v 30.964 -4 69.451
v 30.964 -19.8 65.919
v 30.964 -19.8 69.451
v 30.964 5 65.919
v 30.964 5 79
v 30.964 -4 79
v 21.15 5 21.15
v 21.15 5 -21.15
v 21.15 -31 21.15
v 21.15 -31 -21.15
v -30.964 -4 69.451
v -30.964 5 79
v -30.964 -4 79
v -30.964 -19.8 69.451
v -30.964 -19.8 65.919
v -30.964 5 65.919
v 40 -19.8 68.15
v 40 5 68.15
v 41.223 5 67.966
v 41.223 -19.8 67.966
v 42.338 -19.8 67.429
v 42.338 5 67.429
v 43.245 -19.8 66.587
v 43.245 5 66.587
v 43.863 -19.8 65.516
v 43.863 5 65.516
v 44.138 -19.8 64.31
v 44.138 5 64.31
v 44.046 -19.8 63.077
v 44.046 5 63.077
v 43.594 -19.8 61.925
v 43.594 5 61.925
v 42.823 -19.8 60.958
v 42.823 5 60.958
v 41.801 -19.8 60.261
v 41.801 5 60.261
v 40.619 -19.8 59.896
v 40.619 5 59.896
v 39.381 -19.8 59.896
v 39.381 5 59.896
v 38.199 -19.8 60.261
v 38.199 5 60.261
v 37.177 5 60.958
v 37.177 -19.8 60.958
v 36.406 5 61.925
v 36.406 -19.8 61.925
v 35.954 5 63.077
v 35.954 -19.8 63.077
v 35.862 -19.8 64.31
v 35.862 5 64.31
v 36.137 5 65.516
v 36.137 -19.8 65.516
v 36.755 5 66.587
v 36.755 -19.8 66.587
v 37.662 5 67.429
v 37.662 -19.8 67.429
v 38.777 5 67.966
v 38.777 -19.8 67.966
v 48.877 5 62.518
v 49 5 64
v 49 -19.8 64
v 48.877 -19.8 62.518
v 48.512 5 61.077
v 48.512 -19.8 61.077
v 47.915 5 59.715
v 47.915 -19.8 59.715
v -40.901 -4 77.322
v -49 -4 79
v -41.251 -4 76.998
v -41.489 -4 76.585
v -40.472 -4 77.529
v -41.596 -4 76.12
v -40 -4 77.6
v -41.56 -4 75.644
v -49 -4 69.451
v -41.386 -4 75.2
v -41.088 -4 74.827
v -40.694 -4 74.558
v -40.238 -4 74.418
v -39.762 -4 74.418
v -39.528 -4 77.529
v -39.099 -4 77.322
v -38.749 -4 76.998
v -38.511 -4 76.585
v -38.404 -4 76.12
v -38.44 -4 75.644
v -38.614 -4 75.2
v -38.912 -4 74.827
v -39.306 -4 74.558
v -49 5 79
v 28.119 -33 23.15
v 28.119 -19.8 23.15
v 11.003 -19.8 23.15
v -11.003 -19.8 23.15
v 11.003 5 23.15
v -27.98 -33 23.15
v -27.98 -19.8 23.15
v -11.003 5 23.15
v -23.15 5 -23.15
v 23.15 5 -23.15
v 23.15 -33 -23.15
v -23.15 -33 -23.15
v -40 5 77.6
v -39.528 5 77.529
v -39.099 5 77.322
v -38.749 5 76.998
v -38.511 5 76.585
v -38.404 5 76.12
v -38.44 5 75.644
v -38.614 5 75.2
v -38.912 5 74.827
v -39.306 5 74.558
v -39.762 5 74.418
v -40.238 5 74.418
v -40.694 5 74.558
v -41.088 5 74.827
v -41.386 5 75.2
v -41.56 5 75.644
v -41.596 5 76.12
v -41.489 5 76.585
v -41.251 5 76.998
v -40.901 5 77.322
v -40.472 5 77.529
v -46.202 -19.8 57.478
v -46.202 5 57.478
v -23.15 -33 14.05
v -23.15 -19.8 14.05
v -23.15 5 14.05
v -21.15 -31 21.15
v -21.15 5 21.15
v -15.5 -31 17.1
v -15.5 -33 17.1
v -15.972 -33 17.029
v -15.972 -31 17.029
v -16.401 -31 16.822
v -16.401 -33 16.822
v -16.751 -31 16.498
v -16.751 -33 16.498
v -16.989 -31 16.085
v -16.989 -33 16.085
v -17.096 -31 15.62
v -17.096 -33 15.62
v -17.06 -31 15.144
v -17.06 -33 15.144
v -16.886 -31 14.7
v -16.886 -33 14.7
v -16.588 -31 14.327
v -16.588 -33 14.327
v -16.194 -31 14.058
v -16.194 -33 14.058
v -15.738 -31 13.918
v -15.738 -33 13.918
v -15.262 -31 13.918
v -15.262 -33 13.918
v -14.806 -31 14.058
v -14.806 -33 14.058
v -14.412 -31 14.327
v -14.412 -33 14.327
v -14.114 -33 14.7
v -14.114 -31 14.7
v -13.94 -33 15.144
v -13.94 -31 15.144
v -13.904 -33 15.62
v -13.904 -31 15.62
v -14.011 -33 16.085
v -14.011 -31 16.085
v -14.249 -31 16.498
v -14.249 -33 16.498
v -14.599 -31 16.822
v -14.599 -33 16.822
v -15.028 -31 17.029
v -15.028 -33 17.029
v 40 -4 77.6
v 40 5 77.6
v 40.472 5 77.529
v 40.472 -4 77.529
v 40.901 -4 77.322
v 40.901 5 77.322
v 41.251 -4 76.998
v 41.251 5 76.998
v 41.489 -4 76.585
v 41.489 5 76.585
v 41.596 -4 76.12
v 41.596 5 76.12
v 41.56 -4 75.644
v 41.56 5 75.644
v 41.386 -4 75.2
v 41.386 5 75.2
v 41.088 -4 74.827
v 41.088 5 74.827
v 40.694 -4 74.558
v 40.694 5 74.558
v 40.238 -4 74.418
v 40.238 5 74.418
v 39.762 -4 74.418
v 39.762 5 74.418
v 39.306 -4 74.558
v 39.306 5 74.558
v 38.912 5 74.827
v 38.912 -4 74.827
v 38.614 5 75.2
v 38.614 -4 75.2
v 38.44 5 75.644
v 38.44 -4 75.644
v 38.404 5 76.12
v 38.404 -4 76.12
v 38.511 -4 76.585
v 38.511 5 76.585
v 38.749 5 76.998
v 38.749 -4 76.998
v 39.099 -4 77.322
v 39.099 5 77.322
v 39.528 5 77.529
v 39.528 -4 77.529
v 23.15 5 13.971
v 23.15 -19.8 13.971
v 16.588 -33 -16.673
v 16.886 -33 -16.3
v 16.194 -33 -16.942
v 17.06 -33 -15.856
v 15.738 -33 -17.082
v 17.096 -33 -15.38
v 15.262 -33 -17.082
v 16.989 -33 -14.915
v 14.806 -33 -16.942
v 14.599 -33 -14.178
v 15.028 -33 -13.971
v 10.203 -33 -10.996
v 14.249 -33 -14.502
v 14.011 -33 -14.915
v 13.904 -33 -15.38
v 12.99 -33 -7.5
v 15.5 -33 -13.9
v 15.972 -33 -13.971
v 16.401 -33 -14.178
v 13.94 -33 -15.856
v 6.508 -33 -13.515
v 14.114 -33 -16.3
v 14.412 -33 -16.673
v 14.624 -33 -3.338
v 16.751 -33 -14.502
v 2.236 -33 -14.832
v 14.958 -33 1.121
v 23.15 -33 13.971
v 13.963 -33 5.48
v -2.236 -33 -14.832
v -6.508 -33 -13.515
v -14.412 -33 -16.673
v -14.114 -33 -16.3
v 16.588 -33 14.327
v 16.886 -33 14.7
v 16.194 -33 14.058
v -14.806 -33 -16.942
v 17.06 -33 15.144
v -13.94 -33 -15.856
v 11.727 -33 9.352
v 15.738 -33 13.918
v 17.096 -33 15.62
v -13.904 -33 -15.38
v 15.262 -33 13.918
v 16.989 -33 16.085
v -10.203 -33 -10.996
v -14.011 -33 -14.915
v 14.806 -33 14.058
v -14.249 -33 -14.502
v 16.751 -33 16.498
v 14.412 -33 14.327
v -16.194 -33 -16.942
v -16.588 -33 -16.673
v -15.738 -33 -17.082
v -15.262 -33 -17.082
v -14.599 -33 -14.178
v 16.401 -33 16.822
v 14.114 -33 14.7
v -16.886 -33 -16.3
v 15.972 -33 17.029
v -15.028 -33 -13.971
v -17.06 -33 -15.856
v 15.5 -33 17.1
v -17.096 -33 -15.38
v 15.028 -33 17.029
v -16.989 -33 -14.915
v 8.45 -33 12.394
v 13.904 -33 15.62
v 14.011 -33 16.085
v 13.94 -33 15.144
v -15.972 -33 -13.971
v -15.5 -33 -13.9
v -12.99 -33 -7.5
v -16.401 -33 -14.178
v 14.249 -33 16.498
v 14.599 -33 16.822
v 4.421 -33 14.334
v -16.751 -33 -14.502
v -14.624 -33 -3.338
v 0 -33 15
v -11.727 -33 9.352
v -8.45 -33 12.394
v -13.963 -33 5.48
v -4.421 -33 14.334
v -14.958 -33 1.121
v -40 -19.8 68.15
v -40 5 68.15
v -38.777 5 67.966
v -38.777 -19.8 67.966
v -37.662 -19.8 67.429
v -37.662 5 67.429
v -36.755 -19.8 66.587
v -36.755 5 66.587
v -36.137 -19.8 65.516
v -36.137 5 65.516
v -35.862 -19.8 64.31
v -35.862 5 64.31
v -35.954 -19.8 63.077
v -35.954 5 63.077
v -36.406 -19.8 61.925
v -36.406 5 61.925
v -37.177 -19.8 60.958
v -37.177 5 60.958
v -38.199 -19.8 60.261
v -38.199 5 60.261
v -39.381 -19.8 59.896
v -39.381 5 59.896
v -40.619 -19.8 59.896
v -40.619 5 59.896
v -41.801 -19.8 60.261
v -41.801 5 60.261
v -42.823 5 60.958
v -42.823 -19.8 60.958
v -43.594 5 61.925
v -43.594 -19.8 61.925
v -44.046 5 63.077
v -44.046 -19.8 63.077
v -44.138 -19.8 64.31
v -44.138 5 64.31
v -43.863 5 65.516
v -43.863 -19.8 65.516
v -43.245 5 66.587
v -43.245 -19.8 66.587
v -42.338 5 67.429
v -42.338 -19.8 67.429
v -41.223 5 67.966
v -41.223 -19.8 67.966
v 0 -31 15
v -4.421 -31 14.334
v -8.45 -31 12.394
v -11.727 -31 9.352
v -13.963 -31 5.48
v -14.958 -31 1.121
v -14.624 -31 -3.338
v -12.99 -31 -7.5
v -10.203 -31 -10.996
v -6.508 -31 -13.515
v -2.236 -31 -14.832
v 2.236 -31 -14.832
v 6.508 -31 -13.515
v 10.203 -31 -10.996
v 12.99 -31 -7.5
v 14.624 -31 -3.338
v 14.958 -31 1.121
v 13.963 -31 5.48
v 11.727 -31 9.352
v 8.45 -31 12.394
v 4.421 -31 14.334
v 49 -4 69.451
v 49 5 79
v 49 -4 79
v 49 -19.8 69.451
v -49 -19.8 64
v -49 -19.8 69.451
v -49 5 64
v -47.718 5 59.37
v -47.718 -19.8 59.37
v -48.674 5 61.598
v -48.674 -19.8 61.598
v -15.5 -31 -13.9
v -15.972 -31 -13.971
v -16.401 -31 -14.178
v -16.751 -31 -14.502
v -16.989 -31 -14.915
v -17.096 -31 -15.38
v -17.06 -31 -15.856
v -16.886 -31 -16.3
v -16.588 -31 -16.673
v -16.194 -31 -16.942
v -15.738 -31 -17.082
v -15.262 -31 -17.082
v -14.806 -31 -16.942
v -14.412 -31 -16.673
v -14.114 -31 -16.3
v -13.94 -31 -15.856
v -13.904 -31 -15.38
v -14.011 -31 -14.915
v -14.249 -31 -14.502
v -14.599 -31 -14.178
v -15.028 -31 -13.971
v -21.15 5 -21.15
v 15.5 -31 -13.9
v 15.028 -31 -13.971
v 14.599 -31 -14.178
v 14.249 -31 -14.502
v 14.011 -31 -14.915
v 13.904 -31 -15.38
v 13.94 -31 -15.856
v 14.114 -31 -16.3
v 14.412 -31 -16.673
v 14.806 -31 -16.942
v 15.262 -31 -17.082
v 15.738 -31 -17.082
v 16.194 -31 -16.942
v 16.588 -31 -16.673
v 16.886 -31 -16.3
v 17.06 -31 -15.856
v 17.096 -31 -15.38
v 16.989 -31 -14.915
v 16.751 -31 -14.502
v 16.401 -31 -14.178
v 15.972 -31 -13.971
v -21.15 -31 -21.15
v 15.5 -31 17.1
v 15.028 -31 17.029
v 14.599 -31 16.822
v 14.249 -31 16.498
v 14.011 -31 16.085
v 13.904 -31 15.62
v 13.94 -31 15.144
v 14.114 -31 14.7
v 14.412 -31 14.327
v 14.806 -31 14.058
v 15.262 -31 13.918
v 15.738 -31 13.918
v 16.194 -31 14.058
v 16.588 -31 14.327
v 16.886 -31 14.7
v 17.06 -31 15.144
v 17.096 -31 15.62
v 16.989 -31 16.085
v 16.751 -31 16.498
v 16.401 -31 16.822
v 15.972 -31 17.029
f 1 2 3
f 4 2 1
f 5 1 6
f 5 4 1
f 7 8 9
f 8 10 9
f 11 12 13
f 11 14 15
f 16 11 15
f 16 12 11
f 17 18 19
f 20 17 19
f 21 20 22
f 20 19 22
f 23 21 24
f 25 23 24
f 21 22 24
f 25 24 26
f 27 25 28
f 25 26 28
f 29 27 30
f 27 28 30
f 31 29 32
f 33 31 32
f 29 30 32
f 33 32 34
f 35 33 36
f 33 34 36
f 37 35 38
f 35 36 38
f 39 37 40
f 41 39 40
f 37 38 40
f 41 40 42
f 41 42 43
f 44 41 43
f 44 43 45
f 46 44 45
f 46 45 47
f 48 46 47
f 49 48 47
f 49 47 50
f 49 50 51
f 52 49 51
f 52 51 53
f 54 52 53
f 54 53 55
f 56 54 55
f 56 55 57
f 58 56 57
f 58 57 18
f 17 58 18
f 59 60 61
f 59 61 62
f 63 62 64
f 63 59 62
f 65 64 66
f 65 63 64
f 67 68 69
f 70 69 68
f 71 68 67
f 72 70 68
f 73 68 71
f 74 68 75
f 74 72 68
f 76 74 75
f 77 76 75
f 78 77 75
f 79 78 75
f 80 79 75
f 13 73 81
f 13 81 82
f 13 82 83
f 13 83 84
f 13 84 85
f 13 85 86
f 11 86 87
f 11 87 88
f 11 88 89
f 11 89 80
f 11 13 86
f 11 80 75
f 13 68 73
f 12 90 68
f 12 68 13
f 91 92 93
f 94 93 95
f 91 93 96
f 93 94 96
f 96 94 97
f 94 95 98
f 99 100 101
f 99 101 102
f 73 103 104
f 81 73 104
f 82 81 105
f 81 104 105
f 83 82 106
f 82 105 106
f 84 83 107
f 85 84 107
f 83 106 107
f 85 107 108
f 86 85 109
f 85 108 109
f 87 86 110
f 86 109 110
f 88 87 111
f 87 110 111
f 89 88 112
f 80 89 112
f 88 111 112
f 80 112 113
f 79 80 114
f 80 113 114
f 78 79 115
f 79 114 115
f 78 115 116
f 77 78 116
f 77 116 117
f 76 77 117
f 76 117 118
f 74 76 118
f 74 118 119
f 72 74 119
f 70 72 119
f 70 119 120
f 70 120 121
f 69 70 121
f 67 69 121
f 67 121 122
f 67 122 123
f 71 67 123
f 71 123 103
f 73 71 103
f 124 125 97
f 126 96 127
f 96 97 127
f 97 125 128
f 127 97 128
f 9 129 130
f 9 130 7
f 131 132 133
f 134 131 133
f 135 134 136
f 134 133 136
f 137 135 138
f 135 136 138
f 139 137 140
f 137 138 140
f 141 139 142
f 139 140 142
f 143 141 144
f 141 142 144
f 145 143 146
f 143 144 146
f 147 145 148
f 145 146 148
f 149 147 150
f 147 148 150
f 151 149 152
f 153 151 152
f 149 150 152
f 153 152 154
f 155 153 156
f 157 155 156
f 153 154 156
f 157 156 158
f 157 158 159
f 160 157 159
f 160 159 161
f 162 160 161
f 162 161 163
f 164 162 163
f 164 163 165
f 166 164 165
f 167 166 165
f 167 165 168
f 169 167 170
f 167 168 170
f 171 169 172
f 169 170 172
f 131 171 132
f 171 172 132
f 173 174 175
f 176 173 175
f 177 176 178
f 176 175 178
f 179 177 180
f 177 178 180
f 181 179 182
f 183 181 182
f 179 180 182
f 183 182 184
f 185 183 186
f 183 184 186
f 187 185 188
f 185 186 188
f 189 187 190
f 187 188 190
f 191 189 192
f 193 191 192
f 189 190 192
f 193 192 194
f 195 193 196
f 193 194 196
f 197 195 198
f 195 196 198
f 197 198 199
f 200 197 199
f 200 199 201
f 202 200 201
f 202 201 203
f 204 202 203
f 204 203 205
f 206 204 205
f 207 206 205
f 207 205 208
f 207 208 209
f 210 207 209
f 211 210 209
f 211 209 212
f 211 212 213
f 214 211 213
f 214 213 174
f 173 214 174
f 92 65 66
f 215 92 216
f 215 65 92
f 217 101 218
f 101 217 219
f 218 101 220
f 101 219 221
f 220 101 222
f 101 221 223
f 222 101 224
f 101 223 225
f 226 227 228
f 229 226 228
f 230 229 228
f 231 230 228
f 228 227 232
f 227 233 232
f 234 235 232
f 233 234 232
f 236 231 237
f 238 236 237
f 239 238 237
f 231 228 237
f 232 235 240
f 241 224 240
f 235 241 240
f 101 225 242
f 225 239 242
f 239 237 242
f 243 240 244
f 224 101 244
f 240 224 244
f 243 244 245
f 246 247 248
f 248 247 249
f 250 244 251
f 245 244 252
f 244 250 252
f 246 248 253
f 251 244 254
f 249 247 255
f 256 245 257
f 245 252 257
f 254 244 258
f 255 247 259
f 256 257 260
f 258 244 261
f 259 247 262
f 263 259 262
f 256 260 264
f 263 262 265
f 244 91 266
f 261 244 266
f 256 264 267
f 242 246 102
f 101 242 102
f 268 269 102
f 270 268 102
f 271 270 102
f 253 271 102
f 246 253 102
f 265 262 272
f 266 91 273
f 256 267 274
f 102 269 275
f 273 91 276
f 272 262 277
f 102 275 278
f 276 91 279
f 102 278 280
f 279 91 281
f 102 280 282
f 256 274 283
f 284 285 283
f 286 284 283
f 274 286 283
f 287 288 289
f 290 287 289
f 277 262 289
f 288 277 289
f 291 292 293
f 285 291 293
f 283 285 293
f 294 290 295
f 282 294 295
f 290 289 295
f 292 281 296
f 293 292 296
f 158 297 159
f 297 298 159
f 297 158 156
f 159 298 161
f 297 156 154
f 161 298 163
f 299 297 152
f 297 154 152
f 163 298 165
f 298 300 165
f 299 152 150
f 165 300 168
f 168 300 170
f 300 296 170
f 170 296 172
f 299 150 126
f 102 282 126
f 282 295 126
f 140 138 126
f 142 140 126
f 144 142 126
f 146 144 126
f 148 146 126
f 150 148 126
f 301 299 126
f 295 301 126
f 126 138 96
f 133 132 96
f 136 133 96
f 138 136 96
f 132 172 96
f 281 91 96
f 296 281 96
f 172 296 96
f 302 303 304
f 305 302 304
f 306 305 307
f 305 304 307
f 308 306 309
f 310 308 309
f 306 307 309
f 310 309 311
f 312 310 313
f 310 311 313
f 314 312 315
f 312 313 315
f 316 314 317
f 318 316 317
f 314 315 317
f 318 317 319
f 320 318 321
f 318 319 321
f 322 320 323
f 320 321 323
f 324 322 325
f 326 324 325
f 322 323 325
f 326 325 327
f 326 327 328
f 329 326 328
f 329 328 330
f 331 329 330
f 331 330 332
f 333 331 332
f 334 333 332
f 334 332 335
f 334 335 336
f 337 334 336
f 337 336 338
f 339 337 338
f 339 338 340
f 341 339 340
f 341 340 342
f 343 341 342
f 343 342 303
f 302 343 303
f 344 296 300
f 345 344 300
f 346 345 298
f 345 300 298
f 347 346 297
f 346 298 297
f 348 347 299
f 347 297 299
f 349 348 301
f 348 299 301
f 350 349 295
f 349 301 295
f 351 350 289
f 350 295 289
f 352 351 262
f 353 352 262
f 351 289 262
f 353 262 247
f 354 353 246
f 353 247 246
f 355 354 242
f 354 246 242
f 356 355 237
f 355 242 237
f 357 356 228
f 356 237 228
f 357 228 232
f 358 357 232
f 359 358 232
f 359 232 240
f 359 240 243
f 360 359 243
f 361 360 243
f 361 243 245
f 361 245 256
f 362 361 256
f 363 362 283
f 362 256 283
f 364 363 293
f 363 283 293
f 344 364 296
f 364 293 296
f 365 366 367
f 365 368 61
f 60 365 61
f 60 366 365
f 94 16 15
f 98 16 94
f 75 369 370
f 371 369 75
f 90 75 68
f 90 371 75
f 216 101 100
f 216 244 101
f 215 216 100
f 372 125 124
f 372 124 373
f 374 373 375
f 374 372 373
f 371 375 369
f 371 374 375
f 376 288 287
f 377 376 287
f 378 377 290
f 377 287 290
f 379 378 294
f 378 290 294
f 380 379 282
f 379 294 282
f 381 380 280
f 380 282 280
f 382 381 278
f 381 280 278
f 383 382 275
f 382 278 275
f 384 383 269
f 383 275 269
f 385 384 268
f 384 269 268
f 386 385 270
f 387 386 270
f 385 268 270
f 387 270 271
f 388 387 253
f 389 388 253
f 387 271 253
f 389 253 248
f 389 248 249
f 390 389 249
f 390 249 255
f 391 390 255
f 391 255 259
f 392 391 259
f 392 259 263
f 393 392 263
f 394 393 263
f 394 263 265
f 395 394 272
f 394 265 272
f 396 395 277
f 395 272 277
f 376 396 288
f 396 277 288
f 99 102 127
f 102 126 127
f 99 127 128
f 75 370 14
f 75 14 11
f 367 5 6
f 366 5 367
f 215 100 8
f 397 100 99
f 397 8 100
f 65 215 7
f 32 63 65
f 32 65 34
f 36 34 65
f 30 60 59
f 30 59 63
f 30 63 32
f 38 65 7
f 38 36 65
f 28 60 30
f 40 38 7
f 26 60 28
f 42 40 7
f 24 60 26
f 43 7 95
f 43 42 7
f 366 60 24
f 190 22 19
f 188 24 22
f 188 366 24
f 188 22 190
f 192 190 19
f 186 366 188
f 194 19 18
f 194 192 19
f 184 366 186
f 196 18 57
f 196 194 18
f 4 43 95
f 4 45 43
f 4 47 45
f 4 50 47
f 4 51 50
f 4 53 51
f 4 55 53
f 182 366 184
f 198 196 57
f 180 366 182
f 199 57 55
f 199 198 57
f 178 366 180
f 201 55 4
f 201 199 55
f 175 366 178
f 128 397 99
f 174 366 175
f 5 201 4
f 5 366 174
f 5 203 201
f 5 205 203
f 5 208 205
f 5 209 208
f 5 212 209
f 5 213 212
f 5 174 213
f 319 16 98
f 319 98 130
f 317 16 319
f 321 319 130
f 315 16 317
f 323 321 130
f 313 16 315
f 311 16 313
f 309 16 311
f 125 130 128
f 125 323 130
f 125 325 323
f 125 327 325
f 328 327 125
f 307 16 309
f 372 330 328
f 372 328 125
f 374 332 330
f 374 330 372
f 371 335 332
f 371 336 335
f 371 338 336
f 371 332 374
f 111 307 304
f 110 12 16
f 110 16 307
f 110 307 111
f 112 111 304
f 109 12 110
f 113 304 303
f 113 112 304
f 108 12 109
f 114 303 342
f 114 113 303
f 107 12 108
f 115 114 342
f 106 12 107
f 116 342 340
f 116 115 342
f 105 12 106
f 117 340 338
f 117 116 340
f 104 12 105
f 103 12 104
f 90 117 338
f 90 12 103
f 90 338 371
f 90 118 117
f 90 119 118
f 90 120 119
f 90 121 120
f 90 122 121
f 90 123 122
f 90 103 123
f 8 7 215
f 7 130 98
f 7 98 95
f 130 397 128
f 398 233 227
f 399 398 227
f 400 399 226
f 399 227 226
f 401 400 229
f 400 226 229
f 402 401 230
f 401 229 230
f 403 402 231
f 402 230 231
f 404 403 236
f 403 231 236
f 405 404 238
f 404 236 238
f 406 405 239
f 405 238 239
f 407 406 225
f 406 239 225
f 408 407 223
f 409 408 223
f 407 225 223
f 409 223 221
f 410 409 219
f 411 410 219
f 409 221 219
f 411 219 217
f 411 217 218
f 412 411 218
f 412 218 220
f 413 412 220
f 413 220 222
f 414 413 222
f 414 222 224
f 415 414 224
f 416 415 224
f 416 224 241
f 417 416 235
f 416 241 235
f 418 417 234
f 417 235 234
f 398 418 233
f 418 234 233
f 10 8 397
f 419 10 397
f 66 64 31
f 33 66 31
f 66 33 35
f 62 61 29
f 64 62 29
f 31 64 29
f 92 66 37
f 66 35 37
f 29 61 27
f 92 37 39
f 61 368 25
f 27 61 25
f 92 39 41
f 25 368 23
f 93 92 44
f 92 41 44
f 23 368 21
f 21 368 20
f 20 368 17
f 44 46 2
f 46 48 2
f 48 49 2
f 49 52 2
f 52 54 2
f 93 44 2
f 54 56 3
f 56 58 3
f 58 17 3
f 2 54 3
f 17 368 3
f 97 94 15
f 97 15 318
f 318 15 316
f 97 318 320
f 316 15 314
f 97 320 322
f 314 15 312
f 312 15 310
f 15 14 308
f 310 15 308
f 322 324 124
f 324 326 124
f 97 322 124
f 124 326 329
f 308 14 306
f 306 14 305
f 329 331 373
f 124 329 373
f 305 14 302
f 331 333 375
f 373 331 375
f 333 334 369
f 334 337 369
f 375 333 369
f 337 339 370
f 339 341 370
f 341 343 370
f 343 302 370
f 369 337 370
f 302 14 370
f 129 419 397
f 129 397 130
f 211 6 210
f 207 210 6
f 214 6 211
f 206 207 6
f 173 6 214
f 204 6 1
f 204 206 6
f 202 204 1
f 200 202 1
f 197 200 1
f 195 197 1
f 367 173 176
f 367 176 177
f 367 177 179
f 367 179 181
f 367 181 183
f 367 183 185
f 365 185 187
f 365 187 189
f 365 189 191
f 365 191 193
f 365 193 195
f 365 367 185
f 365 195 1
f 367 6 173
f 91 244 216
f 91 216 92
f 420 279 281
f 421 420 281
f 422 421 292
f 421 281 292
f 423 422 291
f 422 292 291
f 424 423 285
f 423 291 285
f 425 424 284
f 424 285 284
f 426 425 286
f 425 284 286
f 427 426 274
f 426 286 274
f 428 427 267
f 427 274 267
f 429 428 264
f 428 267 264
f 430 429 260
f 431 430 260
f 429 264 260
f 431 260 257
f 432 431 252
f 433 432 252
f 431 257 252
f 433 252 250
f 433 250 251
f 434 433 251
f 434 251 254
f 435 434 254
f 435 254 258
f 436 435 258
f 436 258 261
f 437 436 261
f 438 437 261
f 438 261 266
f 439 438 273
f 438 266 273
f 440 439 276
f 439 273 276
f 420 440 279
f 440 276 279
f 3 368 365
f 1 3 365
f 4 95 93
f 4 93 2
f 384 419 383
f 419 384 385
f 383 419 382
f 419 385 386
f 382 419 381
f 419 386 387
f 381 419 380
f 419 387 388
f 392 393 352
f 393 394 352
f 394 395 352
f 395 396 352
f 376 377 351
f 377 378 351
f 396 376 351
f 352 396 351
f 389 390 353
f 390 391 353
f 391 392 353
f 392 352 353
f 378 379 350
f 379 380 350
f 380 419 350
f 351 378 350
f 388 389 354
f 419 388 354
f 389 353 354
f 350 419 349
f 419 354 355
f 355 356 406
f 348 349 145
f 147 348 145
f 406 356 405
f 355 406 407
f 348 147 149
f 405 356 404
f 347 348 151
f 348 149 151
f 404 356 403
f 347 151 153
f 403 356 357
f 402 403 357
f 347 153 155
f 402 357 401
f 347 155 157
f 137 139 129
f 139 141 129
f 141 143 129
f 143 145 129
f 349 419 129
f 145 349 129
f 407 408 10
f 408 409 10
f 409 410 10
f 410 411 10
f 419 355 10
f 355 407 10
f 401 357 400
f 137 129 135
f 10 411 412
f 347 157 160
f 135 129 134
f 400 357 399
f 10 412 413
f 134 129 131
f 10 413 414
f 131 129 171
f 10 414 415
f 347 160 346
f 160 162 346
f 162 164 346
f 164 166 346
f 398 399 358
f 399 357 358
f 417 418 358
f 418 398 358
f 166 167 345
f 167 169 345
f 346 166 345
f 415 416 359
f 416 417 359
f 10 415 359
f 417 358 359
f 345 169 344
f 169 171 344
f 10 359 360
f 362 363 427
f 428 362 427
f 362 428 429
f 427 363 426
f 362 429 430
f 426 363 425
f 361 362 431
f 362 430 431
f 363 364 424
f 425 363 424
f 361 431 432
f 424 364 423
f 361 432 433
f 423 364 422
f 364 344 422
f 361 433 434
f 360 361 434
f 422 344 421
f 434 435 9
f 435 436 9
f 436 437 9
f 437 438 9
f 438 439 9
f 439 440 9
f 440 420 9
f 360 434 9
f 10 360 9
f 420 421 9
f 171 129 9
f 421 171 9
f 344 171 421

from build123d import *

# Parameters (mm, degrees)
SKETCH_6_W           = 42.3
SKETCH_6_H           = 42.3
SKETCH_6_R           = 1.6
SKETCH_6_R_2         = 15
EXTRUDE_1_DEPTH      = 5
SKETCH_7_R           = 1.6
SKETCH_7_R_2         = 4.15
EXTRUDE_5_DEPTH      = 38
EXTRUDE_START        = 38
SKETCH_7_7_R         = 4.15
SKETCH_7_7_R_2       = 1.6
EXTRUDE_7_DEPTH      = 38
SKETCH_7_8_R         = 4.15
SKETCH_7_8_R_2       = 1.6
EXTRUDE_8_DEPTH      = 38
SKETCH_12_W          = 2
SKETCH_12_H          = 44.3
EXTRUDE_11_DEPTH     = 38
SKETCH_14_W          = 44.3
SKETCH_14_H          = 2
EXTRUDE_12_DEPTH     = 38
SKETCH_15_W          = 2
SKETCH_15_H          = 42.3
EXTRUDE_13_DEPTH     = 38
CUT_EXTRUDE_1_DEPTH  = 13.2
CUT_EXTRUDE_2_DEPTH  = 123
SKETCH_19_R          = 1.5
CUT_EXTRUDE_3_DEPTH  = 10
EXTRUDE_15_DEPTH     = 11.2
EXTRUDE_16_DEPTH     = 11.2
EXTRUDE_17_DEPTH     = 2
SKETCH_26_R          = 1.6
SKETCH_26_R_2        = 15
CUT_EXTRUDE_10_DEPTH = 2
SKETCH_27_W          = 42.3
SKETCH_27_H          = 42.3
CUT_EXTRUDE_12_DEPTH = 5
SKETCH_29_W          = 46.3
SKETCH_29_H          = 38
EXTRUDE_18_DEPTH     = 2


with BuildPart() as part:
    # 草图6 → 凸台-拉伸1 (new body)
    with BuildSketch(Plane(origin=(0, 0, 0), x_dir=(1, 0, 0), z_dir=(0, 1, 0))):
        Rectangle(SKETCH_6_W, SKETCH_6_H)
        with Locations(Location((15.5, 15.5, 0), (0, 0, 270))):
            Circle(SKETCH_6_R, mode=Mode.SUBTRACT)
        with Locations(Location((-15.5, 15.5, 0), (0, 0, 270))):
            Circle(SKETCH_6_R, mode=Mode.SUBTRACT)
        with Locations(Location((-15.5, -15.5, 0), (0, 0, 270))):
            Circle(SKETCH_6_R, mode=Mode.SUBTRACT)
        with Locations(Location((15.5, -15.5, 0), (0, 0, 270))):
            Circle(SKETCH_6_R, mode=Mode.SUBTRACT)
        with Locations(Location((0, 0, 0), (0, 0, 270))):
            Circle(SKETCH_6_R_2, mode=Mode.SUBTRACT)
    extrude(amount=EXTRUDE_1_DEPTH)

    # 草图7 → 凸台-拉伸5 (add)
    # profile 1 of 2: a face of its own
    with BuildSketch(Plane(origin=(0, 5, 0), x_dir=(1, 0, 0), z_dir=(0, 1, 0))):
        with BuildLine():
            Line((49, -79), (49, -64))
            ThreePointArc((49, -64), (48.724429591, -61.789948347), (47.914593709, -59.715235547))
            Line((47.914593709, -59.715235547), (21.15, -10.277072187))
            Line((21.15, -10.277072187), (21.15, -21.15))
            Line((21.15, -21.15), (10.070005019, -21.15))
            Line((10.070005019, -21.15), (30.963898233, -65.919418373))
            Line((30.963898233, -65.919418373), (30.963898233, -79))
            Line((30.963898233, -79), (49, -79))
        make_face()
        with Locations(Location((40, -76, 0), (0, 0, 270))):
            Circle(SKETCH_7_R, mode=Mode.SUBTRACT)
        with Locations(Location((40, -64, 0), (0, 0, 270))):
            Circle(SKETCH_7_R_2, mode=Mode.SUBTRACT)
    # profile 2 of 2: a face of its own
    with BuildSketch(Plane(origin=(0, 5, 0), x_dir=(1, 0, 0), z_dir=(0, 1, 0))):
        with BuildLine():
            Line((-30.963898233, -65.919418373), (-10.070005019, -21.15))
            Line((-10.070005019, -21.15), (-21.15, -21.15))
            Line((-21.15, -21.15), (-21.15, -10.282583808))
            Line((-21.15, -10.282583808), (-46.202269248, -57.478354795))
            ThreePointArc((-46.202269248, -57.478354795), (-48.271046585, -60.45179082), (-49, -64))
            Line((-49, -64), (-49, -79))
            Line((-49, -79), (-30.963898233, -79))
            Line((-30.963898233, -79), (-30.963898233, -65.919418373))
        make_face()
        with Locations(Location((-40, -76, 0), (0, 0, 270))):
            Circle(SKETCH_7_R, mode=Mode.SUBTRACT)
        with Locations(Location((-40, -64, 0), (0, 0, 270))):
            Circle(SKETCH_7_R_2, mode=Mode.SUBTRACT)
    extrude(amount=-EXTRUDE_5_DEPTH)

    # 草图7<7> → 凸台-拉伸7 (add)
    with BuildSketch(Plane(origin=(0, 5, 0), x_dir=(1, 0, 0), z_dir=(0, 1, 0)).offset(EXTRUDE_START)):
        with Locations(Location((-40, -64, 0), (0, 0, 270))):
            Circle(SKETCH_7_7_R)
        with Locations(Location((40, -64, 0), (0, 0, 270))):
            Circle(SKETCH_7_7_R)
        with Locations(Location((40, -76, 0), (0, 0, 270))):
            Circle(SKETCH_7_7_R_2)
        with Locations(Location((-40, -76, 0), (0, 0, 270))):
            Circle(SKETCH_7_7_R_2)
    extrude(amount=-EXTRUDE_7_DEPTH)


with BuildPart() as extrude_7_kept_piece:
    # of the separate pieces the step leaves, the one the design keeps (extrude_7_pieces_kept)
    add(part.part.solids().sort_by_distance((-10.070005019, 0, 21.15))[0])

    # 草图7<8> → 凸台-拉伸8 (add)
    with BuildSketch(Plane(origin=(0, 5, 0), x_dir=(1, 0, 0), z_dir=(0, 1, 0))):
        with Locations(Location((-40, -64, 0), (0, 0, 270))):
            Circle(SKETCH_7_8_R)
        with Locations(Location((40, -64, 0), (0, 0, 270))):
            Circle(SKETCH_7_8_R)
        with Locations(Location((40, -76, 0), (0, 0, 270))):
            Circle(SKETCH_7_8_R_2)
        with Locations(Location((-40, -76, 0), (0, 0, 270))):
            Circle(SKETCH_7_8_R_2)
    extrude(amount=EXTRUDE_8_DEPTH)


with BuildPart() as extrude_8_kept_piece:
    # of the separate pieces the step leaves, the one the design keeps (extrude_8_pieces_kept)
    add(extrude_7_kept_piece.part.solids().sort_by_distance((-10.070005019, 0, 21.15))[0])

    # 草图12 → 凸台-拉伸11 (add)
    with BuildSketch(Plane(origin=(0, 5, 0), x_dir=(1, 0, 0), z_dir=(0, 1, 0))):
        with Locations((22.15, -1)):
            Rectangle(SKETCH_12_W, SKETCH_12_H)
    extrude(amount=-EXTRUDE_11_DEPTH)

    # 草图14 → 凸台-拉伸12 (add)
    with BuildSketch(Plane(origin=(0, 5, 0), x_dir=(1, 0, 0), z_dir=(0, 1, 0))):
        with Locations((-1, -22.15)):
            Rectangle(SKETCH_14_W, SKETCH_14_H)
    extrude(amount=-EXTRUDE_12_DEPTH)

    # 草图15 → 凸台-拉伸13 (add)
    with BuildSketch(Plane(origin=(0, 5, 0), x_dir=(1, 0, 0), z_dir=(0, 1, 0))):
        with Locations((-22.15, 0)):
            Rectangle(SKETCH_15_W, SKETCH_15_H)
    extrude(amount=-EXTRUDE_13_DEPTH)

    # 草图17 → 切除-拉伸1 (cut)
    with BuildSketch(Plane.XZ.offset(33)):
        Polygon((62.040525686, 30.953335803), (62.040525686, -32.044280047), (-61.83718559, -32.044280047), (-61.83718559, 30.953335803), (-61.83718559, 85.06296978), (-8.604799232, 85.06296978), (62.040525686, 85.06296978), align=None)
    extrude(amount=-CUT_EXTRUDE_1_DEPTH, mode=Mode.SUBTRACT)

    # 草图18 → 切除-拉伸2 (cut)
    with BuildSketch(Plane(origin=(49, 0, 0), x_dir=(0, 0, -1), z_dir=(1, 0, 0))):
        Polygon((-79, -4), (-69.450510985, -4), (-69.450510985, -12.643215043), (-69.450510985, -19.8), (-79, -19.8), (-79, -12.643215043), align=None)
    extrude(amount=-CUT_EXTRUDE_2_DEPTH, mode=Mode.SUBTRACT)

    # 草图19 → 切除-拉伸3 (cut)
    with BuildSketch(Plane(origin=(0, 0, 0), x_dir=(-1, 0, 0), z_dir=(0, -1, 0))):
        with Locations(Location((0, -17.95, 0), (0, 0, 90))):
            Circle(SKETCH_19_R)
        with Locations(Location((0, 17.95, 0), (0, 0, 90))):
            Circle(SKETCH_19_R)
    extrude(amount=-CUT_EXTRUDE_3_DEPTH, mode=Mode.SUBTRACT)

    # 草图23 → 凸台-拉伸15 (add)
    with BuildSketch(Plane(origin=(0, -19.8, 0), x_dir=(-1, 0, 0), z_dir=(0, -1, 0))):
        Polygon((-21.15, 21.15), (-23.15, 21.15), (-23.15, -13.971368009), (-23.15, -23.15), (-11.003405272, -23.15), (11.003405272, -23.15), (23.15, -23.15), (23.15, -14.050367917), (23.15, 21.15), (21.15, 21.15), (21.15, -21.15), (-21.15, -21.15), align=None)
    extrude(amount=EXTRUDE_15_DEPTH)

    # 草图24 → 凸台-拉伸16 (add)
    with BuildSketch(Plane(origin=(0, -19.8, 0), x_dir=(-1, 0, 0), z_dir=(0, -1, 0))):
        Polygon((23.15, -23.15), (27.980230087, -23.15), (23.15, -14.050367917), align=None)
        Polygon((-23.15, -23.15), (-28.119083383, -23.15), (-23.15, -13.971368009), align=None)
    extrude(amount=EXTRUDE_16_DEPTH)

    # 草图25 → 凸台-拉伸17 (add)
    with BuildSketch(Plane.XZ.offset(31)):
        Polygon((28.119083383, 23.15), (-27.980230087, 23.15), (-23.15, 14.050367917), (-23.15, -21.15), (23.15, -21.15), (23.15, 13.971368009), align=None)
    extrude(amount=EXTRUDE_17_DEPTH)

    # 草图26 → 切除-拉伸10 (cut)
    with BuildSketch(Plane.XZ.offset(33)):
        with Locations(Location((-15.5, 15.5, 0), (0, 0, 90))):
            Circle(SKETCH_26_R)
        with Locations(Location((15.5, 15.5, 0), (0, 0, 90))):
            Circle(SKETCH_26_R)
        with Locations(Location((15.5, -15.5, 0), (0, 0, 90))):
            Circle(SKETCH_26_R)
        with Locations(Location((-15.5, -15.5, 0), (0, 0, 90))):
            Circle(SKETCH_26_R)
        with Locations(Location((0, 0, 0), (0, 0, 90))):
            Circle(SKETCH_26_R_2)
    extrude(amount=-CUT_EXTRUDE_10_DEPTH, mode=Mode.SUBTRACT)

    # 草图27 → 切除-拉伸12 (cut)
    with BuildSketch(Plane.XZ):
        Rectangle(SKETCH_27_W, SKETCH_27_H)
    extrude(amount=-CUT_EXTRUDE_12_DEPTH, mode=Mode.SUBTRACT)

    # 草图29 → 凸台-拉伸18 (add)
    with BuildSketch(Plane(origin=(0, 0, -21.15), x_dir=(-1, 0, 0), z_dir=(0, 0, -1))):
        with Locations((0, -14)):
            Rectangle(SKETCH_29_W, SKETCH_29_H)
    extrude(amount=EXTRUDE_18_DEPTH)


solid = extrude_8_kept_piece.part
